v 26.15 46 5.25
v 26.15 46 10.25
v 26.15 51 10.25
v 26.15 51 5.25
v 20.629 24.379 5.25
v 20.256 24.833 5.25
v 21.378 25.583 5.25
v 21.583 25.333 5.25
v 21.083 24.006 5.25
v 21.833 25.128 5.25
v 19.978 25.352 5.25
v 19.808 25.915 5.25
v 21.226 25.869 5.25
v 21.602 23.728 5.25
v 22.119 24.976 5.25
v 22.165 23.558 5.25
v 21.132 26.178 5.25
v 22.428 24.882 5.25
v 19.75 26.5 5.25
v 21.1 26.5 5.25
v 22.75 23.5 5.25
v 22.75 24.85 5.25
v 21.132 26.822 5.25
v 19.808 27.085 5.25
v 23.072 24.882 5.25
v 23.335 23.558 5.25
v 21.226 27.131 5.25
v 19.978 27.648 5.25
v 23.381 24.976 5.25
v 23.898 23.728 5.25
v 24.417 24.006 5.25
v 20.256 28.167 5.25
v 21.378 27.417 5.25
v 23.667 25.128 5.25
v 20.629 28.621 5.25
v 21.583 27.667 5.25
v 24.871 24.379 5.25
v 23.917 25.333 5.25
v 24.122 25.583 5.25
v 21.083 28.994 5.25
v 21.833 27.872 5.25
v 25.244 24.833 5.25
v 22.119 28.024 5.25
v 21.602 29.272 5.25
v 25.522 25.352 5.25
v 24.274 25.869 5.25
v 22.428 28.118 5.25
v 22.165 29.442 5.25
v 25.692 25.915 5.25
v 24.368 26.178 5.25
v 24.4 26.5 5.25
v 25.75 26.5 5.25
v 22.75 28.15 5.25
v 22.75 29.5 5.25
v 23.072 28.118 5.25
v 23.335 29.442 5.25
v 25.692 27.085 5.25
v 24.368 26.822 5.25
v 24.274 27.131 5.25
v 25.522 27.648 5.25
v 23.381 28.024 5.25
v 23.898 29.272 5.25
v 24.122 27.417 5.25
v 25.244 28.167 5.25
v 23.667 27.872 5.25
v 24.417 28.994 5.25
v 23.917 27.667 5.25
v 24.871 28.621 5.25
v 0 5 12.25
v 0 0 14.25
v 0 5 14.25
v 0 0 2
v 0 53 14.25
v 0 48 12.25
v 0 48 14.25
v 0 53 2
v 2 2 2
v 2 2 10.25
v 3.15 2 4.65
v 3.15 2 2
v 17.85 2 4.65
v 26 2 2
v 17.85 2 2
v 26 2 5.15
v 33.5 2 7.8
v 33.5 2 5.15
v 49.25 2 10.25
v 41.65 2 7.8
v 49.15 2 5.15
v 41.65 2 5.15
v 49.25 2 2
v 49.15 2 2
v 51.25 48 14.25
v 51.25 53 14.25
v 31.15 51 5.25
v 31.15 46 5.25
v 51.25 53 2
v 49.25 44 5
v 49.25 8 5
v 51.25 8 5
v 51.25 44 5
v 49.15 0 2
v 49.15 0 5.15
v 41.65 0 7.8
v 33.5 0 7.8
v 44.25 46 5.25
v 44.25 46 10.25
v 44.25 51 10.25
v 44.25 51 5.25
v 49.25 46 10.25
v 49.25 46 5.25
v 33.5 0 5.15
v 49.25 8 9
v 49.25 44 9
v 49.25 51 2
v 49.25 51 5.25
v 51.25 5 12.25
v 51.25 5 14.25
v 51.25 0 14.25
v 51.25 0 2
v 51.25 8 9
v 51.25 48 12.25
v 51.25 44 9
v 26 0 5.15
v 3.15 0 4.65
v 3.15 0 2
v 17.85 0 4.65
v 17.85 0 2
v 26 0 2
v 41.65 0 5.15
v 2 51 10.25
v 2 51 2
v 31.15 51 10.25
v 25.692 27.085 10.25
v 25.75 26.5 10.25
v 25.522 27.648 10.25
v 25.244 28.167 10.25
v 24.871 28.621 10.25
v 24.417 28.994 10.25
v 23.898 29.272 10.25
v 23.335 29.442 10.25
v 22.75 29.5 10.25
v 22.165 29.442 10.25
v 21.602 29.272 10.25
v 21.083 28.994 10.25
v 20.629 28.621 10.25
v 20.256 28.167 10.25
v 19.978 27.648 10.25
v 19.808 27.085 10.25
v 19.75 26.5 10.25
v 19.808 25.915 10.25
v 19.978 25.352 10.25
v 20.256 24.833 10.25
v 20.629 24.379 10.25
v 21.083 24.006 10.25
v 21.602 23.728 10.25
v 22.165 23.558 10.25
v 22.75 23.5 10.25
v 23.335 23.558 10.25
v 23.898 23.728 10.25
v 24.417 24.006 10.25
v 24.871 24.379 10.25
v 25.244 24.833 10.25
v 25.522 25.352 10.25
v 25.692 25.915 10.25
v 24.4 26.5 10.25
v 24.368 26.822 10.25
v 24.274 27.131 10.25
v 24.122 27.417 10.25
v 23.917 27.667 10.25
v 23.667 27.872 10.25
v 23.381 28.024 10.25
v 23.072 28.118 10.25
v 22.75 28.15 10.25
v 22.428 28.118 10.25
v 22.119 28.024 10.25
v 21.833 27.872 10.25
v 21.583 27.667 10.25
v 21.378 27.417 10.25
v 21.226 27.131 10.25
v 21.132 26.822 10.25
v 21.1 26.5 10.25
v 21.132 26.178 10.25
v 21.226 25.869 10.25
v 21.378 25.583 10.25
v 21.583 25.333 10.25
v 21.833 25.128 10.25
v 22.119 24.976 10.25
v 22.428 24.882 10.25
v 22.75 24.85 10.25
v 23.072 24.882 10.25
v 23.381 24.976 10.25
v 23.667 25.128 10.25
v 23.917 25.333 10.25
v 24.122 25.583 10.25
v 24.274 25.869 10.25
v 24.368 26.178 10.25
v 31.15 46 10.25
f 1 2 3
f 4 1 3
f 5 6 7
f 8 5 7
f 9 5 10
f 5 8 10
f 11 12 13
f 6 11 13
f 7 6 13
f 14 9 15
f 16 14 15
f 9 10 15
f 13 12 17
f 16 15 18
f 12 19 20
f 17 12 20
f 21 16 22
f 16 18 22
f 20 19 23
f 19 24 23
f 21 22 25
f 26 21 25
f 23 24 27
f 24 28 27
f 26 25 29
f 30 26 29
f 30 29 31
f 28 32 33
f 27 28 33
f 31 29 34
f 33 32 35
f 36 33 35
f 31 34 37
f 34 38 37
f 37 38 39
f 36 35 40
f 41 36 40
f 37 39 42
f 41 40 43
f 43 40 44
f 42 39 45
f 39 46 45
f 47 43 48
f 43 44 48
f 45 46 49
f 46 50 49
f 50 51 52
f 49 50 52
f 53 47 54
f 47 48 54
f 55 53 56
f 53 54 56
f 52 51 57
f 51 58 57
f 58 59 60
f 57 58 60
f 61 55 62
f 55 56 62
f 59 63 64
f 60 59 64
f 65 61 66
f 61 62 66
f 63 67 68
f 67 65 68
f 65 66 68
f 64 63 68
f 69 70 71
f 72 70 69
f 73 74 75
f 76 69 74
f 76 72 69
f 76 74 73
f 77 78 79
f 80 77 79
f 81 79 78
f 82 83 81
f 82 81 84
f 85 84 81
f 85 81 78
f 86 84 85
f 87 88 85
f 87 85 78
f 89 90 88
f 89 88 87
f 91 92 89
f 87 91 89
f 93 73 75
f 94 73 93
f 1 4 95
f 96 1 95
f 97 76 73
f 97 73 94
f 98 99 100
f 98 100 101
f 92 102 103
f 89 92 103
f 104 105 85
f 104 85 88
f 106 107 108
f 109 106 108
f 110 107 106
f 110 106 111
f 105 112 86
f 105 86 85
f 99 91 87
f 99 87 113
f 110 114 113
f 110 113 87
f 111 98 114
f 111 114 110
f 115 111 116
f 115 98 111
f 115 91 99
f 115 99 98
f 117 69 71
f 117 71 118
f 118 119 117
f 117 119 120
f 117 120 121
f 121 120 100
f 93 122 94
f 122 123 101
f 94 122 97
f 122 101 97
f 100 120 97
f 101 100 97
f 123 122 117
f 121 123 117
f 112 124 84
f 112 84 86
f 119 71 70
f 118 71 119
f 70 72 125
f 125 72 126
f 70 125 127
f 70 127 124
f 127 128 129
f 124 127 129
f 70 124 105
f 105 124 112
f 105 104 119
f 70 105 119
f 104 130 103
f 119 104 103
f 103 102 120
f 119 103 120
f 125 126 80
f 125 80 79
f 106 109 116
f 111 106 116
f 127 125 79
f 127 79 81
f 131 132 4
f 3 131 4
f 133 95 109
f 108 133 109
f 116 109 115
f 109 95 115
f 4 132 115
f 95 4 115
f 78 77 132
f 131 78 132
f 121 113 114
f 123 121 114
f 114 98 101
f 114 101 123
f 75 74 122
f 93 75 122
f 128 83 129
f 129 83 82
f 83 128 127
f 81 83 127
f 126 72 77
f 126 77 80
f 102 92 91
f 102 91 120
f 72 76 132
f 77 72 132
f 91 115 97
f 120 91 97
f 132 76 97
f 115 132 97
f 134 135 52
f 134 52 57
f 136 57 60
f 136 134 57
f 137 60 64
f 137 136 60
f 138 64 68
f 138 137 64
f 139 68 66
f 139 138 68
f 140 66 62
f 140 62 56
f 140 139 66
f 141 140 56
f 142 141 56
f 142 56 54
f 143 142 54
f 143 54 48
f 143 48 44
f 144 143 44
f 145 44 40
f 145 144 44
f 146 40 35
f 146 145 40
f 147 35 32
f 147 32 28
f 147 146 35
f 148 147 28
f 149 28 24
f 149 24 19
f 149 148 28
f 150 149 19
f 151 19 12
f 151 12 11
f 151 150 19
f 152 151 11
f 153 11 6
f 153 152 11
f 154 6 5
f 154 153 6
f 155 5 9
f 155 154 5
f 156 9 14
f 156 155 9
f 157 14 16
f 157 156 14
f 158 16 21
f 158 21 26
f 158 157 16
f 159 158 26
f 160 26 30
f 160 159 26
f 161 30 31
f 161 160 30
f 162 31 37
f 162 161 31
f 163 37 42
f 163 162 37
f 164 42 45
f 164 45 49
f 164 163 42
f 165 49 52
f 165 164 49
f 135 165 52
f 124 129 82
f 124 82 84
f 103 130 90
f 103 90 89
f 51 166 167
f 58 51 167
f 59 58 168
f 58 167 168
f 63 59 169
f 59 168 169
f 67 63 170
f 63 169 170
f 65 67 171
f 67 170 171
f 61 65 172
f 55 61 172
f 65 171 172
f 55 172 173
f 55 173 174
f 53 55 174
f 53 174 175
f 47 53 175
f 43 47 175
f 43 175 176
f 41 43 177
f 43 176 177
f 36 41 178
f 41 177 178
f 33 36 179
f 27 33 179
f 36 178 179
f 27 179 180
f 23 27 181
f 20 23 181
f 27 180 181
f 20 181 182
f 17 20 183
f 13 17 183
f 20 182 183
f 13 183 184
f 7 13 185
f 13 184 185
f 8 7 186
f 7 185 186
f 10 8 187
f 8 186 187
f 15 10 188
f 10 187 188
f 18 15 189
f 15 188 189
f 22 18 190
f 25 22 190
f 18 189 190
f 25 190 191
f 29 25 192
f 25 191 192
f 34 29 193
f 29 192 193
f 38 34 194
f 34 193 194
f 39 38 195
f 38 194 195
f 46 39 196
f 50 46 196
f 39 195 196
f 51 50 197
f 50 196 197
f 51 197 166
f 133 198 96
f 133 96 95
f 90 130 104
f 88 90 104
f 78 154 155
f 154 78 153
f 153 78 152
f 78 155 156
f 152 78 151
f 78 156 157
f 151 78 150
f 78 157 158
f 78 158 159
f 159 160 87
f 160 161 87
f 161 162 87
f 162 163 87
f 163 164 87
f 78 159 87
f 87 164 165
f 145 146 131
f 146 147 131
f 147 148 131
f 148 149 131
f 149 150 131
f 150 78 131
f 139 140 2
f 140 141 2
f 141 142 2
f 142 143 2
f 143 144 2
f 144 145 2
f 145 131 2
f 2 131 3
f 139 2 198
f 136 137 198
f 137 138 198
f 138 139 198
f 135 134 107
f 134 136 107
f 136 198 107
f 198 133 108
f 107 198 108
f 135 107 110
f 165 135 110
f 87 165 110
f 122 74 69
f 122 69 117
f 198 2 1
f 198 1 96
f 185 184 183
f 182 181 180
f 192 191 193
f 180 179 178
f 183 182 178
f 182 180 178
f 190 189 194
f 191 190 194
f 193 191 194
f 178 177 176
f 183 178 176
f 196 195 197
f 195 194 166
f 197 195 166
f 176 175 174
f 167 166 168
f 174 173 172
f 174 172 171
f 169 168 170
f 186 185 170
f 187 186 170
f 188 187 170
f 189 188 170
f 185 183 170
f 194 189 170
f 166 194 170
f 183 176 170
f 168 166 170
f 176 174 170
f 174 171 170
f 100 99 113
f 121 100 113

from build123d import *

# Parameters (mm, degrees)
SKETCH035_W      = 36
SKETCH035_H      = 4
EXTRUDE033_DEPTH = 2
SKETCH029_W      = 51.25
SKETCH029_H      = 5
EXTRUDE027_DEPTH = 2
SKETCH017_W      = 8.15
SKETCH017_H      = 2.65
EXTRUDE013_DEPTH = 2
SKETCH010_W      = 14.7
SKETCH010_H      = 2.65
SKETCH010_W_2    = 23.15
SKETCH010_H_2    = 3.15
EXTRUDE006_DEPTH = 2
SKETCH_R         = 1.65
EXTRUDE026_DEPTH = 5
SKETCH009_W      = 51.25
SKETCH009_H      = 53
SKETCH009_W_2    = 47.25
SKETCH009_H_2    = 49
EXTRUDE004_DEPTH = 10.25
SKETCH008_W      = 51.25
SKETCH008_H      = 53
EXTRUDE003_DEPTH = 2
SKETCH028_W      = 5
SKETCH028_H      = 5
EXTRUDE025_DEPTH = 5
SKETCH012_R      = 3
EXTRUDE008_DEPTH = 5


with BuildPart() as topcut002:
    # Sketch035 → Extrude033 (new body)
    with BuildSketch(Plane.YZ.offset(49.25)):
        with Locations((26, 7)):
            Rectangle(SKETCH035_W, SKETCH035_H)
    extrude(amount=EXTRUDE033_DEPTH)


with BuildPart() as top006:
    # Sketch029 → Extrude027 (new body)
    with BuildSketch(Plane.XY.offset(12.25)):
        with Locations((25.625, 2.5)):
            Rectangle(SKETCH029_W, SKETCH029_H)
        with Locations((25.625, 50.5)):
            Rectangle(SKETCH029_W, SKETCH029_H)
    extrude(amount=EXTRUDE027_DEPTH)


with BuildPart() as topcut001:
    # Sketch017 → Extrude013 (new body)
    with BuildSketch(Plane.XZ):
        with Locations((37.575, 6.475)):
            Rectangle(SKETCH017_W, SKETCH017_H)
    extrude(amount=-EXTRUDE013_DEPTH)


with BuildPart() as topcuts:
    # Sketch010 → Extrude006 (new body)
    with BuildSketch(Plane.XZ):
        with Locations((10.5, 3.325)):
            Rectangle(SKETCH010_W, SKETCH010_H)
        with Locations((37.575, 3.575)):
            Rectangle(SKETCH010_W_2, SKETCH010_H_2)
    extrude(amount=-EXTRUDE006_DEPTH)


with BuildPart() as topcuts001:
    # Sketch → Extrude026 (new body)
    with BuildSketch(Plane.XY.offset(10.25)):
        with Locations((22.75, 26.5)):
            Circle(SKETCH_R)
    extrude(amount=-EXTRUDE026_DEPTH)

    # Fusion007: union topCut001, topCuts
    add(topcut001.part)
    add(topcuts.part)


with BuildPart() as top:
    # Sketch009 → Extrude004 (new body)
    with BuildSketch(Plane.XY):
        with Locations((25.625, 26.5)):
            Rectangle(SKETCH009_W, SKETCH009_H)
        with Locations((25.625, 26.5)):
            Rectangle(SKETCH009_W_2, SKETCH009_H_2, mode=Mode.SUBTRACT)
    extrude(amount=EXTRUDE004_DEPTH)


with BuildPart() as top_1:
    # Extrude004 placement: moved
    add(top.part.moved(Location((0, 0, 2))))


with BuildPart() as top002:
    # Sketch008 → Extrude003 (new body)
    with BuildSketch(Plane.XY):
        with Locations((25.625, 26.5)):
            Rectangle(SKETCH008_W, SKETCH008_H)
    extrude(amount=EXTRUDE003_DEPTH)


with BuildPart() as top002_1:
    # Extrude003 placement: moved
    add(top002.part.moved(Location((0, 0, 10.25))))

    # Fusion: union top
    add(top_1.part)


with BuildPart() as topaddons:
    # Sketch028 → Extrude025 (new body)
    with BuildSketch(Plane.XY.offset(10.25)):
        with Locations((28.65, 48.5)):
            Rectangle(SKETCH028_W, SKETCH028_H)
        with Locations((46.75, 48.5)):
            Rectangle(SKETCH028_W, SKETCH028_H)
    extrude(amount=-EXTRUDE025_DEPTH)


with BuildPart() as top008:
    # Sketch012 → Extrude008 (new body)
    with BuildSketch(Plane.XY.offset(10.25)):
        with Locations((22.75, 26.5)):
            Circle(SKETCH012_R)
    extrude(amount=-EXTRUDE008_DEPTH)

    # Fusion005: union top002, topAddOns
    add(top002_1.part)
    add(topaddons.part)

    # Cut: cut topCuts001
    add(topcuts001.part, mode=Mode.SUBTRACT)

    # Fusion008: union top006
    add(top006.part)

    # Cut004: cut topCut002
    add(topcut002.part, mode=Mode.SUBTRACT)


solid = top008.part
